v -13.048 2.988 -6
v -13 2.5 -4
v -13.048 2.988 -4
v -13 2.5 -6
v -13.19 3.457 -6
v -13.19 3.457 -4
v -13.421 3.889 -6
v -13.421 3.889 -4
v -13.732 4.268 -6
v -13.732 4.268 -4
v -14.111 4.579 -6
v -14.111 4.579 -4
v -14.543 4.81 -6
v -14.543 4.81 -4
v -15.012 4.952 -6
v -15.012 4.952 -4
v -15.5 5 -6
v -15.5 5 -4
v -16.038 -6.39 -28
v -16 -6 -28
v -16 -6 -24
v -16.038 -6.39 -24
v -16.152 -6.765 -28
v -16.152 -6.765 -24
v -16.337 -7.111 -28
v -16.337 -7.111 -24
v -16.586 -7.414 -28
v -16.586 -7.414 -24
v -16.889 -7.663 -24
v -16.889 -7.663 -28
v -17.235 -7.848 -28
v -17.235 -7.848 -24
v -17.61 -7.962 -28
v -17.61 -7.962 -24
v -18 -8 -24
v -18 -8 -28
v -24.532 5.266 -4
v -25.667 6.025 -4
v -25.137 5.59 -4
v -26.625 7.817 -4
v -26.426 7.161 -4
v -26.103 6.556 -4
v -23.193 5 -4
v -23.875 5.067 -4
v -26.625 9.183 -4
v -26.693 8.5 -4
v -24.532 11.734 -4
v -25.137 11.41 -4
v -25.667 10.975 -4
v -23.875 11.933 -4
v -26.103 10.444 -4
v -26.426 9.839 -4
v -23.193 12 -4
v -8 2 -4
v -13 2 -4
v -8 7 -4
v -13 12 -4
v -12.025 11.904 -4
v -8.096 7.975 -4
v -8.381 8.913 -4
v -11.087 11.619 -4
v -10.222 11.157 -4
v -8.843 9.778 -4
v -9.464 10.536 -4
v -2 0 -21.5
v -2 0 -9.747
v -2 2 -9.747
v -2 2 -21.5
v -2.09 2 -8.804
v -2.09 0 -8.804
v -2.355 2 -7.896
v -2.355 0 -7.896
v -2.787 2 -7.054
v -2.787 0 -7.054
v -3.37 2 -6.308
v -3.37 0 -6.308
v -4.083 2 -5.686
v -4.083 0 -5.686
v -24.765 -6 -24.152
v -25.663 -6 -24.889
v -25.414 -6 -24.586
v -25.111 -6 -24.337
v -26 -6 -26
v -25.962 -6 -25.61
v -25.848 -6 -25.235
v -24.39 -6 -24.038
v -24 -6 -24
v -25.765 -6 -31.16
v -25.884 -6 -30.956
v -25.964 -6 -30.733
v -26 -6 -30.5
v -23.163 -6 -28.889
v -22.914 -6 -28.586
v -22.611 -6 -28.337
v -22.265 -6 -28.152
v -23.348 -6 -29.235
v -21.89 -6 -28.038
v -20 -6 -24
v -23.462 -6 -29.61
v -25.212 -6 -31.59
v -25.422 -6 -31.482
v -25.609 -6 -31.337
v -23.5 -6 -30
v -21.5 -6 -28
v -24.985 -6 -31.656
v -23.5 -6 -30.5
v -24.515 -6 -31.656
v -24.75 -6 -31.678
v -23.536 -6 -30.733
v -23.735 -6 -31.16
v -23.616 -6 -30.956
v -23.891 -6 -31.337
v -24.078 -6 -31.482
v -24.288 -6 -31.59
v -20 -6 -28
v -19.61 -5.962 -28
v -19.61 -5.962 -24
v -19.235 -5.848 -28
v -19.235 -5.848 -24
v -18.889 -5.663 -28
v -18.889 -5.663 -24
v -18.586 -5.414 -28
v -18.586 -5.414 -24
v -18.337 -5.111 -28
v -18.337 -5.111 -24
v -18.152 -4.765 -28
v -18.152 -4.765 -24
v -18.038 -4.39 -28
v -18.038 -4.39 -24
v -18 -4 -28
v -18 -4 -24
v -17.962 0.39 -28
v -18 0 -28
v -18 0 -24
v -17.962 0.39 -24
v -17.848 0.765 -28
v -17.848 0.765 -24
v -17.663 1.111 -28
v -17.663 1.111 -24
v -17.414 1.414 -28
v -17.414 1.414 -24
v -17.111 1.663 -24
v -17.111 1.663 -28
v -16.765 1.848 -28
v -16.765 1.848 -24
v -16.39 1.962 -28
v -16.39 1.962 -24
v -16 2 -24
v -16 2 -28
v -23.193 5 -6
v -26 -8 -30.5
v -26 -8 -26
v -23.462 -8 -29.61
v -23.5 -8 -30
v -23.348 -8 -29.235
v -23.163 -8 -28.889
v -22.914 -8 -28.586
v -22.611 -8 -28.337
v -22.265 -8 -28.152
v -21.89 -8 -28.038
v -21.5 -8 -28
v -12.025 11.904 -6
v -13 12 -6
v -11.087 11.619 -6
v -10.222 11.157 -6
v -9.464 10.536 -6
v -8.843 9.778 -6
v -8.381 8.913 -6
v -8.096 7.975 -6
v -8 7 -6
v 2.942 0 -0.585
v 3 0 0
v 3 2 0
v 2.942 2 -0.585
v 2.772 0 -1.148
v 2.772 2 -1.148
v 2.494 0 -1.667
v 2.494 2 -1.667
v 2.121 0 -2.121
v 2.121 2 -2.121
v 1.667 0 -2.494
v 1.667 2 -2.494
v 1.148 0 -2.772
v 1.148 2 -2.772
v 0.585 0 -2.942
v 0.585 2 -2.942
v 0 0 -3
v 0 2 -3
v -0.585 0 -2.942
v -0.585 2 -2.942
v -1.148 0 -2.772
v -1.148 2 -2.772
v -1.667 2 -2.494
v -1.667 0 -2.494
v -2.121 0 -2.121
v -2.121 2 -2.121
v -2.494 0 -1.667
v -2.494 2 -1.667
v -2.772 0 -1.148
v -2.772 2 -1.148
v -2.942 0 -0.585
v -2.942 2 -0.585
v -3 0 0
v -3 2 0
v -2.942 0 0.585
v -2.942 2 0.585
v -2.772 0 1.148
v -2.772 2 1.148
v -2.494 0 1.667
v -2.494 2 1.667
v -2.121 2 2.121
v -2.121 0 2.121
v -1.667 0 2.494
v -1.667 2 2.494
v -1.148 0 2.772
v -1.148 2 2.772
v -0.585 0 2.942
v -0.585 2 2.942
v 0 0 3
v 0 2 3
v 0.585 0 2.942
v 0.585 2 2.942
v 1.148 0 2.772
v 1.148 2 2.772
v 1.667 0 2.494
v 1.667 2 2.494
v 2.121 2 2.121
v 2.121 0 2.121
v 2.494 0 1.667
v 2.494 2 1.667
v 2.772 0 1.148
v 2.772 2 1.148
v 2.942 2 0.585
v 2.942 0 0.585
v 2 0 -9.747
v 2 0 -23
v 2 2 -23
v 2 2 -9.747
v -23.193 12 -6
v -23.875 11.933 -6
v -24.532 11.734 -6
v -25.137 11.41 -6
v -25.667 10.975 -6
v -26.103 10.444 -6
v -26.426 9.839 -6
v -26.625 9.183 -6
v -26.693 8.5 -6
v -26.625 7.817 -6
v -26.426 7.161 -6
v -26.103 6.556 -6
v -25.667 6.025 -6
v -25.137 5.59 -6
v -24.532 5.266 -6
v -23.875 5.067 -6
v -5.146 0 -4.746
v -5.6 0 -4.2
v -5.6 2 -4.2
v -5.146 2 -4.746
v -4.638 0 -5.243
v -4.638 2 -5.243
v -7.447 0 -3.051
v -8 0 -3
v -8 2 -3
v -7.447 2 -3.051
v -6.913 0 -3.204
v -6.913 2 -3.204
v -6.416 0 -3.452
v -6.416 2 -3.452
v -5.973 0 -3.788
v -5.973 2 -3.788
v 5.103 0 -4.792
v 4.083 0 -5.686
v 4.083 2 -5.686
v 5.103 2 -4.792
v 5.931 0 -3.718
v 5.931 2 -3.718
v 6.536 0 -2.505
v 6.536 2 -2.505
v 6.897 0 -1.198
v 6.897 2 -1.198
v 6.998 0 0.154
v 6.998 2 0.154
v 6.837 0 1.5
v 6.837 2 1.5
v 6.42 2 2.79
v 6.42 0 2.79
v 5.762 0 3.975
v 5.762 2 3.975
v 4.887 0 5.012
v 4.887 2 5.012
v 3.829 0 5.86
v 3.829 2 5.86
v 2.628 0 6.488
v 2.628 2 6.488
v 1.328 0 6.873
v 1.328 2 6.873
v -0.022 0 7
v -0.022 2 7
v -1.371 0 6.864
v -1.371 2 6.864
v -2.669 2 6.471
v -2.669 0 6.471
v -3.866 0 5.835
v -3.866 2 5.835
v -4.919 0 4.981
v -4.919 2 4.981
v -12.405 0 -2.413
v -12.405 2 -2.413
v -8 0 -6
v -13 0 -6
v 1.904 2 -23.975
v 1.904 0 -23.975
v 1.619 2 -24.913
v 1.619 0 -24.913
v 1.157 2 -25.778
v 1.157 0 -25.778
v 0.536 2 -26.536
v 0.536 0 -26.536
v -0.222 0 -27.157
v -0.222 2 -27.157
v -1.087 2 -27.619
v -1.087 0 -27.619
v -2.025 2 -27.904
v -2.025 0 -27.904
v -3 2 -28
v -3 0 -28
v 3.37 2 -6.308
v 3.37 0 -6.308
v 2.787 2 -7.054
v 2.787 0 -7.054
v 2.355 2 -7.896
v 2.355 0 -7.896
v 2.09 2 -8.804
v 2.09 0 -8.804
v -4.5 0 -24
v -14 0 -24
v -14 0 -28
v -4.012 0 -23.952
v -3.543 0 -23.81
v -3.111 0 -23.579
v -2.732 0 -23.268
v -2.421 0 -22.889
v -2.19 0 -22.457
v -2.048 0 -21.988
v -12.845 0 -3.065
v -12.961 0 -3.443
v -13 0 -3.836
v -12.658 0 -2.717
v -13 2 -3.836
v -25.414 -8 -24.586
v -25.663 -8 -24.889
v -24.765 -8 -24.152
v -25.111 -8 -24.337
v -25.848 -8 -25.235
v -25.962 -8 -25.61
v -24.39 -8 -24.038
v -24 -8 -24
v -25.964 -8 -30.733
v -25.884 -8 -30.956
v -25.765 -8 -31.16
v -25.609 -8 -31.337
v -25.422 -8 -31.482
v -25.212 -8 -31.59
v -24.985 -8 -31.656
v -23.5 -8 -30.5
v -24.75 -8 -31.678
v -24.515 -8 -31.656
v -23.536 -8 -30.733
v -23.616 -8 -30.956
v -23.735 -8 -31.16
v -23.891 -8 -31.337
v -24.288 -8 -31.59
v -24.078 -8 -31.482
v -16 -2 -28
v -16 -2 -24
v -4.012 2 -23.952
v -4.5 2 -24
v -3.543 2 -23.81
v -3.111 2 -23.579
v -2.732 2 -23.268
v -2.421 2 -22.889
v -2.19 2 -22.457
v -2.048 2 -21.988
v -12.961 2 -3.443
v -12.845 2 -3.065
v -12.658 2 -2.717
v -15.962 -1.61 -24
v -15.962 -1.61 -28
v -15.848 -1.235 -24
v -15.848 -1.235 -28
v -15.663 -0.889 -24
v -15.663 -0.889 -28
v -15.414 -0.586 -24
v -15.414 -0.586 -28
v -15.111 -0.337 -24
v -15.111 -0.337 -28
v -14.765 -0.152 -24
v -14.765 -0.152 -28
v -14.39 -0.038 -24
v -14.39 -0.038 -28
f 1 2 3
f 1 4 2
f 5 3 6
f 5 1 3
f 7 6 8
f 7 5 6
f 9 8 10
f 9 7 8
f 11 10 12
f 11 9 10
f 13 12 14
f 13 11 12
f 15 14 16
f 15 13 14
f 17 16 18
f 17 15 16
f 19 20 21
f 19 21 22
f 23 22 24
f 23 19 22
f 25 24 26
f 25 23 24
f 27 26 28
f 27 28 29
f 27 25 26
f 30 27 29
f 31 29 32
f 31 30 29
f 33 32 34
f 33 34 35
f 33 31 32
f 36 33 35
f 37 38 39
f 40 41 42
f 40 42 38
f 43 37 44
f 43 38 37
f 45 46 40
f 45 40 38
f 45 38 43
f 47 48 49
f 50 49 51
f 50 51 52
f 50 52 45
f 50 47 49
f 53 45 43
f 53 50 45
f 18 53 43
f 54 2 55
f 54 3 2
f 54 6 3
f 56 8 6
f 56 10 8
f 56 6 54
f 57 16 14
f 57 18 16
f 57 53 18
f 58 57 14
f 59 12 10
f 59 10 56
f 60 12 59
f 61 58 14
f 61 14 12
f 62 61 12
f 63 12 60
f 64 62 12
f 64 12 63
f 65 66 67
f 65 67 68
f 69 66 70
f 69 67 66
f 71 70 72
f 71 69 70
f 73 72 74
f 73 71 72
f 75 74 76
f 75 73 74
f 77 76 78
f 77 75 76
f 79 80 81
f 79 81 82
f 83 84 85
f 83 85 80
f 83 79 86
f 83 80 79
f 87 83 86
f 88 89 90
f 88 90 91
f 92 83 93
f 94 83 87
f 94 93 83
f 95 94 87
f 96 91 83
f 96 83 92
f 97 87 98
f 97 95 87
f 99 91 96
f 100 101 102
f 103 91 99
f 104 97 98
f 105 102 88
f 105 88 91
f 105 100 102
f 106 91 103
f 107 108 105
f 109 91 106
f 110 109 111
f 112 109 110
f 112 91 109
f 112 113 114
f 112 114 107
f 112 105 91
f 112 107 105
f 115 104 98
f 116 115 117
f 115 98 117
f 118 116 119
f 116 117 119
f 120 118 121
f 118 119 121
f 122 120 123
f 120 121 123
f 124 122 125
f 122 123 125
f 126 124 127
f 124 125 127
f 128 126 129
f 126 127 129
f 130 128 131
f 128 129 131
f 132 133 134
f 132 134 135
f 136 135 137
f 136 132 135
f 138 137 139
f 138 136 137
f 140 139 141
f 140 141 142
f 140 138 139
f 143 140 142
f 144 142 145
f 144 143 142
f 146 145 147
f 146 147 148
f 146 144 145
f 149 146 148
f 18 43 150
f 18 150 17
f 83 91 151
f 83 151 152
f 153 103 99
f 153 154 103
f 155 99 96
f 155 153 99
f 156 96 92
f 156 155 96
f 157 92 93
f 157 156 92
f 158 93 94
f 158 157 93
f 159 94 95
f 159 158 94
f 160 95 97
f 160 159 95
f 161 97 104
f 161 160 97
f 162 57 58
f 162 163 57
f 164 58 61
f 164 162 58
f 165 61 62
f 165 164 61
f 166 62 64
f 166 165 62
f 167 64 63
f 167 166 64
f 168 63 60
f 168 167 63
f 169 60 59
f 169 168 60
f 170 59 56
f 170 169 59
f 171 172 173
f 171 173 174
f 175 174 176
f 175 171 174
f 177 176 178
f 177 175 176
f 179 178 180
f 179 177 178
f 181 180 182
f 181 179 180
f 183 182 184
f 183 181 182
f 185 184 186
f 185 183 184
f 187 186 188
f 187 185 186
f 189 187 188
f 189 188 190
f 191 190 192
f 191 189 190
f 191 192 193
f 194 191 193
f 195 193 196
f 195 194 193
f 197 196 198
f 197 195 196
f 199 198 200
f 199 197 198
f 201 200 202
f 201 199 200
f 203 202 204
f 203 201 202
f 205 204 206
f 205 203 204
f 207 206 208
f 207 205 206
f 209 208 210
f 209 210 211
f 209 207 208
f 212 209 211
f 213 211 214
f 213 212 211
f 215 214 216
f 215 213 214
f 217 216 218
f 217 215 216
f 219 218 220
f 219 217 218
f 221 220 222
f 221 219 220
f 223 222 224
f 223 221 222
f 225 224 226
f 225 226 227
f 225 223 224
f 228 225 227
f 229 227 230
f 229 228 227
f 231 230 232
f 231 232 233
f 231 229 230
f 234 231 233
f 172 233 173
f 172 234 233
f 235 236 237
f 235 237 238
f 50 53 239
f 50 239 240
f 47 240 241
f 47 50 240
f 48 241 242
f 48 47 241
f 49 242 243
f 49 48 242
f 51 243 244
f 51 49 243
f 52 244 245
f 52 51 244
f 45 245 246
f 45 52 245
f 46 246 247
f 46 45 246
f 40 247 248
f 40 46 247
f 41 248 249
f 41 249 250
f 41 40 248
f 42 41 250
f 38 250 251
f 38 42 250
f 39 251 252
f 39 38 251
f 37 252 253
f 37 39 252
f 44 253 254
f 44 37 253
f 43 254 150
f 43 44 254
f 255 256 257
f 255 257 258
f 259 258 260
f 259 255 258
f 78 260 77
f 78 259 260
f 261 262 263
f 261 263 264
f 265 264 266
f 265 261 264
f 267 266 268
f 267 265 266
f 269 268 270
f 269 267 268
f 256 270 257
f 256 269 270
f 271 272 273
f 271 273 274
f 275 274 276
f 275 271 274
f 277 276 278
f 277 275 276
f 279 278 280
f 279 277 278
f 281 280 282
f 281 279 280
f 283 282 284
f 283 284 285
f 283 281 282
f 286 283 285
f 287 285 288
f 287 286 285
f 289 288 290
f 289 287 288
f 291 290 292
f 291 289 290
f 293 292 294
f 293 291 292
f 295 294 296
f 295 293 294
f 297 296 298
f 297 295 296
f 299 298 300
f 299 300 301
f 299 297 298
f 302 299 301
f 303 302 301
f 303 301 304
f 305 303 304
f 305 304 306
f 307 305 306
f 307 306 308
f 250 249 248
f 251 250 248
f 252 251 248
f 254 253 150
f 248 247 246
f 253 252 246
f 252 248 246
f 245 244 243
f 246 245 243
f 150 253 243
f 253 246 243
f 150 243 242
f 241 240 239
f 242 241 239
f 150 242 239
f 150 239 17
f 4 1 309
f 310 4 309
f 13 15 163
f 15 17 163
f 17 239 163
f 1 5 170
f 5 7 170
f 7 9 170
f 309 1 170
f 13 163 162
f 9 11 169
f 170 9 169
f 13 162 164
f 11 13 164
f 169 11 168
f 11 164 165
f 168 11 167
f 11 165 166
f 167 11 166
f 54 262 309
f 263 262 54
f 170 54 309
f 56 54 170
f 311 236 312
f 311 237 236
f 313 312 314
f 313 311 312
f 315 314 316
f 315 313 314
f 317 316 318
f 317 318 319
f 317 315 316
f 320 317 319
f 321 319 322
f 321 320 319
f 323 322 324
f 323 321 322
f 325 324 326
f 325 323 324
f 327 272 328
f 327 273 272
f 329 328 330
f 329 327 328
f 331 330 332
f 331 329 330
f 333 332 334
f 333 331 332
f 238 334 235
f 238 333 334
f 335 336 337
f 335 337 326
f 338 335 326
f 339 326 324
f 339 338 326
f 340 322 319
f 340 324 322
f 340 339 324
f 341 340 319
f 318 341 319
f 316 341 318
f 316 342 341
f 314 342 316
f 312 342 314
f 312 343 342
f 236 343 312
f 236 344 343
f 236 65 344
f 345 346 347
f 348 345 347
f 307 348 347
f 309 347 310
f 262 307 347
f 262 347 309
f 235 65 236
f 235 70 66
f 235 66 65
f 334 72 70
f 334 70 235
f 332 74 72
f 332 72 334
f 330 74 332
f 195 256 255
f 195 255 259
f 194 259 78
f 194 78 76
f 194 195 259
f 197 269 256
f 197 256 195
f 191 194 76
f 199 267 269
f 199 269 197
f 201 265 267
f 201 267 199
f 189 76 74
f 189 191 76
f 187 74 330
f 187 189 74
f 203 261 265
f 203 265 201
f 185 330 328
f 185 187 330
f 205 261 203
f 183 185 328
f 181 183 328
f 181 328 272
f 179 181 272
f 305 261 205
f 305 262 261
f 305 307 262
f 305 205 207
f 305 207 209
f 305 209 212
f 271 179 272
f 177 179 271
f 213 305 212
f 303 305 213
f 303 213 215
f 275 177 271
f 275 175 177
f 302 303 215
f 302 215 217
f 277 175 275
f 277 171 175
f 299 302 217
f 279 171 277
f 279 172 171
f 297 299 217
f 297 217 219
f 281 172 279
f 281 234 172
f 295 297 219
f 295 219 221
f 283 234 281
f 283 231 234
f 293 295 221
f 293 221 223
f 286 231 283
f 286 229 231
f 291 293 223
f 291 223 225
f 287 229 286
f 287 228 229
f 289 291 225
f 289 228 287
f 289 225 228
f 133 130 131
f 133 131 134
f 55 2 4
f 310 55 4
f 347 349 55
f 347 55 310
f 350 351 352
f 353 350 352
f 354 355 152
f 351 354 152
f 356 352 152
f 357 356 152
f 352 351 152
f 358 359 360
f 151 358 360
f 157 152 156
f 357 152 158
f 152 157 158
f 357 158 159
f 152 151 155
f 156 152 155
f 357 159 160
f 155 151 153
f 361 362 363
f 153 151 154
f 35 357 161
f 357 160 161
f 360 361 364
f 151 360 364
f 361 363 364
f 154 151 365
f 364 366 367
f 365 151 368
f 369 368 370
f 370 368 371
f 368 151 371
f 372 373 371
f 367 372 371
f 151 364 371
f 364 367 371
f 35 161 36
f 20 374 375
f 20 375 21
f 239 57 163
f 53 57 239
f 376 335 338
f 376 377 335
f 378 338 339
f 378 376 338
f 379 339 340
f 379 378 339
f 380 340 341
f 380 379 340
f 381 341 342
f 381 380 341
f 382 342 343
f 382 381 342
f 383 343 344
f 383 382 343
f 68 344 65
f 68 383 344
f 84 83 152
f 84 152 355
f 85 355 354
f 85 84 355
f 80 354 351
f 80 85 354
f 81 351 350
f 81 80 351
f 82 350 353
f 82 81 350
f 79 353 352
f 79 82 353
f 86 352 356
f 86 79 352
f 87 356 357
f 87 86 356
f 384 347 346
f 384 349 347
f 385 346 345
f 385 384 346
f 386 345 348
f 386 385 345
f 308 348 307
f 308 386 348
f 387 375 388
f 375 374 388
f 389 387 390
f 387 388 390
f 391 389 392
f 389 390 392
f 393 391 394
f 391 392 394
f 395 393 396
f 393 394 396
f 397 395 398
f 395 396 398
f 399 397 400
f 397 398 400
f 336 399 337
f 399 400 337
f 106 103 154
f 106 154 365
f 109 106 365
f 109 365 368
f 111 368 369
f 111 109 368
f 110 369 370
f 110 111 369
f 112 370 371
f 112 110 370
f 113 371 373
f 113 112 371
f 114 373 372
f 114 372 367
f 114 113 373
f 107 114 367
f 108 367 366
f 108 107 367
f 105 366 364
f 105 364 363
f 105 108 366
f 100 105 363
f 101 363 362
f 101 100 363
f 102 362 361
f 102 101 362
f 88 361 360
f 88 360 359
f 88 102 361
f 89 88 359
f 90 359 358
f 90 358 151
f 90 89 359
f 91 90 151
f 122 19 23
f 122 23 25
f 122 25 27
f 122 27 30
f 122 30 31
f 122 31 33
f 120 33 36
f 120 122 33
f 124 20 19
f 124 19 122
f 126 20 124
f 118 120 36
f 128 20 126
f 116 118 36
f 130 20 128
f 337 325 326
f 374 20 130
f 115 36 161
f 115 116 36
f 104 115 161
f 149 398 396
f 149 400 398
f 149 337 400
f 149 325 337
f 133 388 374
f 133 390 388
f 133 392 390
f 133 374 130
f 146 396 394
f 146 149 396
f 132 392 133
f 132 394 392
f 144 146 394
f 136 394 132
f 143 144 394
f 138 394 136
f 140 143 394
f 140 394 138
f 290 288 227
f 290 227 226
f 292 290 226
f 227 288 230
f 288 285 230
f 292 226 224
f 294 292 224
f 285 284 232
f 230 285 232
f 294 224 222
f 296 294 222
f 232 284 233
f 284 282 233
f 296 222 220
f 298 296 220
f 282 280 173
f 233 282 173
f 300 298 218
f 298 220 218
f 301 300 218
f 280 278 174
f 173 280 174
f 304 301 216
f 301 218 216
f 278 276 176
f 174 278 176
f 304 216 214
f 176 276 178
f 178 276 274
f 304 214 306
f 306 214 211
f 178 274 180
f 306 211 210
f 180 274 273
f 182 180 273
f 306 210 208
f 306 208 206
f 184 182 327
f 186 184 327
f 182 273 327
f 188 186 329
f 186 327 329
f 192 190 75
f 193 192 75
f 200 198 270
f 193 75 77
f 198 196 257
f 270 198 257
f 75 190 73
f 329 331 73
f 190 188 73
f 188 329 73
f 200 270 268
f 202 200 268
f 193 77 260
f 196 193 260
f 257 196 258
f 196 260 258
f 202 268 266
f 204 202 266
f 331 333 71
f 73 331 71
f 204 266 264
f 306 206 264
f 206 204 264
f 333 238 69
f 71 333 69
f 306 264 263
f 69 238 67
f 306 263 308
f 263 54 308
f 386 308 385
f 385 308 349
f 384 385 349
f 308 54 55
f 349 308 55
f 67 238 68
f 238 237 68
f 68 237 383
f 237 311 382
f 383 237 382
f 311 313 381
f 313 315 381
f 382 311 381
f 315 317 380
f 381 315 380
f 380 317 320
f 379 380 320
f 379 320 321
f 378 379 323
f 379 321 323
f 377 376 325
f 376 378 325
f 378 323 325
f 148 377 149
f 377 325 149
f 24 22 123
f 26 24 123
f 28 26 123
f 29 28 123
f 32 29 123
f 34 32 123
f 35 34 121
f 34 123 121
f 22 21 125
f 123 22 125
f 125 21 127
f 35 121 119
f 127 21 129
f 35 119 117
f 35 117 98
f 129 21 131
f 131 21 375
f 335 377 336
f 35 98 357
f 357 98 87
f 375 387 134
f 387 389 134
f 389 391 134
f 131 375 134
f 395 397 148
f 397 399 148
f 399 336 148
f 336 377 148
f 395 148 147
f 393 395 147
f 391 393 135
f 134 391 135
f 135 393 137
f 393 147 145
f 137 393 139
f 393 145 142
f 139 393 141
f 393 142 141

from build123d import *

# Parameters (mm, degrees)
CROQUIS1_R              = 3
SALIENTE_EXTRUIR1_DEPTH = 2
SALIENTE_EXTRUIR2_DEPTH = 2
REDONDEO1_R             = 5
REDONDEO2_R             = 2.5
REDONDEO3_R             = 5
REDONDEO4_R             = 5
REDONDEO5_R             = 2
REDONDEO6_R             = 5
REDONDEO7_R             = 2.5
SALIENTE_EXTRUIR3_DEPTH = 4
REDONDEO8_R             = 2
REDONDEO9_R             = 2
SALIENTE_EXTRUIR4_DEPTH = 2
REDONDEO10_R            = 2
CORTAR_EXTRUIR1_DEPTH   = 2


with BuildPart() as part:
    # Croquis1 → Saliente-Extruir1 (new body)
    with BuildSketch(Plane(origin=(0, 0, 0), x_dir=(1, 0, 0), z_dir=(0, 1, 0))):
        with BuildLine():
            Line((2, 16.626040067), (2, 6.708203932))
            ThreePointArc((2, 6.708203932), (6.023877075, -3.56551609), (-4.918618823, -4.980681567))
            Line((-4.918618823, -4.980681567), (-13, 3))
            Line((-13, 3), (-13, 4))
            Line((-13, 4), (-8, 4))
            Line((-8, 4), (-8, 3))
            ThreePointArc((-8, 3), (-6.658359214, 3.316718427), (-5.6, 4.2))
            ThreePointArc((-5.6, 4.2), (-4.001596149, 5.743450902), (-2, 6.708203932))
            Line((-2, 6.708203932), (-2, 24))
            Line((-2, 24), (-16, 24))
            Line((-16, 24), (-16, 28))
            Line((-16, 28), (2, 28))
            Line((2, 28), (2, 16.626040067))
        make_face()
        Circle(CROQUIS1_R, mode=Mode.SUBTRACT)
    extrude(amount=SALIENTE_EXTRUIR1_DEPTH)

    # Croquis2 → Saliente-Extruir2 (add)
    with BuildSketch(Plane(origin=(0, 0, -4), x_dir=(-1, 0, 0), z_dir=(0, 0, -1))):
        with BuildLine():
            Line((8, 2), (8, 12))
            Line((8, 12), (23.192528099, 12))
            ThreePointArc((23.192528099, 12), (26.692528099, 8.5), (23.192528099, 5))
            Line((23.192528099, 5), (13, 5))
            Line((13, 5), (13, 2))
            Line((13, 2), (13, 0))
            Line((13, 0), (8, 0))
            Line((8, 0), (8, 2))
        make_face()
    extrude(amount=SALIENTE_EXTRUIR2_DEPTH)

    # Redondeo1
    redondeo1_edges = [part.edges().sort_by_distance(p)[0] for p in [
        (-8, 12, -5),
    ]]
    fillet(redondeo1_edges, radius=REDONDEO1_R)

    # Redondeo2
    redondeo2_edges = [part.edges().sort_by_distance(p)[0] for p in [
        (-13, 5, -5),
    ]]
    fillet(redondeo2_edges, radius=REDONDEO2_R)

    # Redondeo3
    redondeo3_edges = [part.edges().sort_by_distance(p)[0] for p in [
        (2, 1, -6.708203932),
    ]]
    fillet(redondeo3_edges, radius=REDONDEO3_R)

    # Redondeo4
    redondeo4_edges = [part.edges().sort_by_distance(p)[0] for p in [
        (-2, 1, -6.708203932),
    ]]
    fillet(redondeo4_edges, radius=REDONDEO4_R)

    # Redondeo5
    redondeo5_edges = [part.edges().sort_by_distance(p)[0] for p in [
        (-13, 1, -3),
    ]]
    fillet(redondeo5_edges, radius=REDONDEO5_R)

    # Redondeo6
    redondeo6_edges = [part.edges().sort_by_distance(p)[0] for p in [
        (2, 1, -28),
    ]]
    fillet(redondeo6_edges, radius=REDONDEO6_R)

    # Redondeo7
    redondeo7_edges = [part.edges().sort_by_distance(p)[0] for p in [
        (-2, 1, -24),
    ]]
    fillet(redondeo7_edges, radius=REDONDEO7_R)

    # Croquis3 → Saliente-Extruir3 (add)
    with BuildSketch(Plane(origin=(0, 0, -28), x_dir=(-1, 0, 0), z_dir=(0, 0, -1))):
        with BuildLine():
            Line((16, 2), (16, 0))
            Line((16, 0), (16, -6))
            ThreePointArc((16, -6), (16.585786438, -7.414213562), (18, -8))
            Line((18, -8), (26, -8))
            Line((26, -8), (26, -6))
            Line((26, -6), (18, -6))
            Line((18, -6), (18, 0))
            ThreePointArc((18, 0), (17.414213562, 1.414213562), (16, 2))
        make_face()
    extrude(amount=-SALIENTE_EXTRUIR3_DEPTH)

    # Redondeo8
    redondeo8_edges = [part.edges().sort_by_distance(p)[0] for p in [
        (-18, -6, -26),
    ]]
    fillet(redondeo8_edges, radius=REDONDEO8_R)

    # Redondeo9
    redondeo9_edges = [part.edges().sort_by_distance(p)[0] for p in [
        (-16, 0, -26),
    ]]
    fillet(redondeo9_edges, radius=REDONDEO9_R)

    # Croquis4 → Saliente-Extruir4 (add)
    with BuildSketch(Plane(origin=(0, -6, 0), x_dir=(1, 0, 0), z_dir=(0, 1, 0))):
        with BuildLine():
            Line((-23.5, 28), (-23.5, 30.5))
            ThreePointArc((-23.5, 30.5), (-24.75, 31.677994798), (-26, 30.5))
            Line((-26, 30.5), (-26, 28))
            Line((-26, 28), (-23.5, 28))
        make_face()
    extrude(amount=-SALIENTE_EXTRUIR4_DEPTH)

    # Redondeo10
    redondeo10_edges = [part.edges().sort_by_distance(p)[0] for p in [
        (-23.5, -7, -28),
    ]]
    fillet(redondeo10_edges, radius=REDONDEO10_R)

    # Croquis5 → Cortar-Extruir1 (cut)
    with BuildSketch(Plane(origin=(0, -6, 0), x_dir=(1, 0, 0), z_dir=(0, 1, 0))):
        with BuildLine():
            Line((-26, 24), (-26, 26))
            ThreePointArc((-26, 26), (-25.414213562, 24.585786438), (-24, 24))
            Line((-24, 24), (-26, 24))
        make_face()
    extrude(amount=-CORTAR_EXTRUIR1_DEPTH, mode=Mode.SUBTRACT)


solid = part.part
